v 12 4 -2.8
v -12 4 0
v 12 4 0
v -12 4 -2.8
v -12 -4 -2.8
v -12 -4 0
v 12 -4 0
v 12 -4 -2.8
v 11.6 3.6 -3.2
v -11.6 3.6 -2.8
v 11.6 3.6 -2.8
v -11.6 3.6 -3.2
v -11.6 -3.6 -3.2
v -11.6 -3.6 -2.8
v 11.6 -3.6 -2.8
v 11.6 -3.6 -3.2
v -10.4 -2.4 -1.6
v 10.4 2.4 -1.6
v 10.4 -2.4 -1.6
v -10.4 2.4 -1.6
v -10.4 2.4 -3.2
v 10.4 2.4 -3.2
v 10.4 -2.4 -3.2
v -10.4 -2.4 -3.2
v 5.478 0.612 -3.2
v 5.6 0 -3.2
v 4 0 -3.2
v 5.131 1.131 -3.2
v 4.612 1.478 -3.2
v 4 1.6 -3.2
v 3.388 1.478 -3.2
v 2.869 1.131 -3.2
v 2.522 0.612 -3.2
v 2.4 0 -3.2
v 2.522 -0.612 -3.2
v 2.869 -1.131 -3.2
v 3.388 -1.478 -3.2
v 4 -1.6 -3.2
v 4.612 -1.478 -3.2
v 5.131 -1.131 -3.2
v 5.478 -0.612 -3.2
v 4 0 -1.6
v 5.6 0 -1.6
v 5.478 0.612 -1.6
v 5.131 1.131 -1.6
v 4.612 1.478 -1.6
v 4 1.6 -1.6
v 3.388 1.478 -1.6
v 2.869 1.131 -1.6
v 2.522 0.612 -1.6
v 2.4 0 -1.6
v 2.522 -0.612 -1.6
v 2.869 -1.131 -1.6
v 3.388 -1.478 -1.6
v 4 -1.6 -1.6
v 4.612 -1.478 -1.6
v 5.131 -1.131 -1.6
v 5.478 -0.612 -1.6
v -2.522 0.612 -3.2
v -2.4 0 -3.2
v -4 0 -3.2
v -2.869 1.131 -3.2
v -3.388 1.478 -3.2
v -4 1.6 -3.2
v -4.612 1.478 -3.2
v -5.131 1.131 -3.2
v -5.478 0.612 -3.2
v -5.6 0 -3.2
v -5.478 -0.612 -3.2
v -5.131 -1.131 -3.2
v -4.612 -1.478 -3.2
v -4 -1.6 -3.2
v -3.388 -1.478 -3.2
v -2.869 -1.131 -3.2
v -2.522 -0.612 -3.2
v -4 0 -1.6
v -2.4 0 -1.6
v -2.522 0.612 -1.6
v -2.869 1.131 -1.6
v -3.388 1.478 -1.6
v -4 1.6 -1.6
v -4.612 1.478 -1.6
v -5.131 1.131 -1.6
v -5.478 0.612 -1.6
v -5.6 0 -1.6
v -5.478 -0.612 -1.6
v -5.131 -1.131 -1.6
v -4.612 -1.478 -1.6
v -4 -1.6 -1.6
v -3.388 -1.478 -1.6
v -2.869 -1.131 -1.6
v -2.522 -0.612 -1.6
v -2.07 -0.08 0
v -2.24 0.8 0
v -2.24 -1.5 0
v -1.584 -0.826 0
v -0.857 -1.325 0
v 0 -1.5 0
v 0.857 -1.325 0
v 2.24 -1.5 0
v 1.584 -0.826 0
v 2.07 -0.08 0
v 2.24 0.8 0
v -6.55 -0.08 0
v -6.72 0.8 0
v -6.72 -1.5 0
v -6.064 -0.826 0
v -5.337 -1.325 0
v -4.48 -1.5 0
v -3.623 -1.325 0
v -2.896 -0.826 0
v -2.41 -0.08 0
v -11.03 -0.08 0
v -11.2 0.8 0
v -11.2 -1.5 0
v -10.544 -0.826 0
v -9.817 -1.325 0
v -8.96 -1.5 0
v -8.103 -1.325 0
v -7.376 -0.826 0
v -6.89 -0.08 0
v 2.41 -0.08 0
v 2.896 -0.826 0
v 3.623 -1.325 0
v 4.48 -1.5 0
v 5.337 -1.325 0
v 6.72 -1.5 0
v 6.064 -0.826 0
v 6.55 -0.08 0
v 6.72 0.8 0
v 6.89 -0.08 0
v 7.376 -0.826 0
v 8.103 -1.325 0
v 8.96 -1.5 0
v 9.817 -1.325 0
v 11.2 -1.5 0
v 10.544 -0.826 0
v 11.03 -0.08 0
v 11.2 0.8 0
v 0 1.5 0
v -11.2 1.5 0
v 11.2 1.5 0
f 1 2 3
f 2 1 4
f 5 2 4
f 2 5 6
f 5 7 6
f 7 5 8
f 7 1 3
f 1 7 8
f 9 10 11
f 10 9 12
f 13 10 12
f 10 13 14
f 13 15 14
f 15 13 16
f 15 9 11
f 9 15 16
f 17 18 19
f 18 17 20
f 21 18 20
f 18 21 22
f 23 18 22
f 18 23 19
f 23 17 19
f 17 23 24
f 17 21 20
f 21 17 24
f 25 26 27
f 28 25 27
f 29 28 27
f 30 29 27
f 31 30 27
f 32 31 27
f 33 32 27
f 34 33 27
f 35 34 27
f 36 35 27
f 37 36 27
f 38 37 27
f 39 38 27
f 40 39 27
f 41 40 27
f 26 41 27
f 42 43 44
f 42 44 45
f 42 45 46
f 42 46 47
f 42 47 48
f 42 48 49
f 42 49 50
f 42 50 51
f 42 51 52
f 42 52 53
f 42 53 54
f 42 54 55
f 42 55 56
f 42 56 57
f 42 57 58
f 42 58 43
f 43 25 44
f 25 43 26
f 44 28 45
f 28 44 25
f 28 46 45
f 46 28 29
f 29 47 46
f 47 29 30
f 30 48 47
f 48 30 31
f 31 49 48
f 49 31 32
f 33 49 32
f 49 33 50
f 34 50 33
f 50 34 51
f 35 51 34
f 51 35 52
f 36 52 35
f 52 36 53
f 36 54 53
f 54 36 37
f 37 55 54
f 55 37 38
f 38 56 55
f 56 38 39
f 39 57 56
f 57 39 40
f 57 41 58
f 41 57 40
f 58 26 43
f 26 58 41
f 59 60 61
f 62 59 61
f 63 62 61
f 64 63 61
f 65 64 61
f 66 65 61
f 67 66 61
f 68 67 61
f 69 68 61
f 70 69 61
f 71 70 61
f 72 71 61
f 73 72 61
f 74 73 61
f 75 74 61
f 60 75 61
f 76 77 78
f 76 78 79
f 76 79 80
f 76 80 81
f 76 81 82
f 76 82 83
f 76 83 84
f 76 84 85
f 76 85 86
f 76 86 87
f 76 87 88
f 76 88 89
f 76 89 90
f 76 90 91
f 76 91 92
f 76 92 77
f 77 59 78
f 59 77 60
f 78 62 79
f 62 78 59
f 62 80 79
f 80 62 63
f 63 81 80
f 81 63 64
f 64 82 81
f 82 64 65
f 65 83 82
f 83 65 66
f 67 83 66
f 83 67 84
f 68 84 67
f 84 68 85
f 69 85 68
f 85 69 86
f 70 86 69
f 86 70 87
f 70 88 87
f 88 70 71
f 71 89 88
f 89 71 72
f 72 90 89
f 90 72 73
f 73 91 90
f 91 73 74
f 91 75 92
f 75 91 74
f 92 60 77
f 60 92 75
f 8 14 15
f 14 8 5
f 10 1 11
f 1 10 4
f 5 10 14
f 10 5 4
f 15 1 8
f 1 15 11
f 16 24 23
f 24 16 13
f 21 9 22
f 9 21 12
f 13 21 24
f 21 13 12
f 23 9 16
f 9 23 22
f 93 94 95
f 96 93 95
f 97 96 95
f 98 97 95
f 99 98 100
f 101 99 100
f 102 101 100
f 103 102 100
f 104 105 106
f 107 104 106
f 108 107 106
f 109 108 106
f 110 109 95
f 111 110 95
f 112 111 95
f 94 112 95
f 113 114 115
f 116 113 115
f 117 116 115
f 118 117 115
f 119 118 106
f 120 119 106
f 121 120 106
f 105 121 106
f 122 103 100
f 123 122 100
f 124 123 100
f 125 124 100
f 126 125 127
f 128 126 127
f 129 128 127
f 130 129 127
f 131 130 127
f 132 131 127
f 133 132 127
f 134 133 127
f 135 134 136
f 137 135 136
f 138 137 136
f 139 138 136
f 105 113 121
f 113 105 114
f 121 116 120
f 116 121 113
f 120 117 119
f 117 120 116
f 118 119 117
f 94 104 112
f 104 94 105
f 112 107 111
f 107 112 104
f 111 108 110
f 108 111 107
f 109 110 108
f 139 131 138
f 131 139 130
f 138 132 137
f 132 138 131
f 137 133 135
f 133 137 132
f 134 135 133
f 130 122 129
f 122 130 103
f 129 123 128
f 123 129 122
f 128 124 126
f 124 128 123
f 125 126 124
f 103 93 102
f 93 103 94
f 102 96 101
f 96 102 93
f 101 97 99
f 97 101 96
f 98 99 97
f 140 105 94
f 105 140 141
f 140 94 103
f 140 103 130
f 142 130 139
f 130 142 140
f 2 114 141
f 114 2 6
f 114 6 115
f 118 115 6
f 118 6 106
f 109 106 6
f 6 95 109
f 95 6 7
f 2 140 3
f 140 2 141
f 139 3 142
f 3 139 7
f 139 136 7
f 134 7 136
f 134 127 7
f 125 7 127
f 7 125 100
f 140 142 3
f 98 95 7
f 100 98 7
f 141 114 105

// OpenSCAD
// file: ../p/4-4edge.scad
use <../lib.scad>
function ldraw_lib__4_4edge() = [
// 0 Circle 1.0
// 0 Name: 4-4edge.dat
// 0 Author: James Jessiman
// 0 !LDRAW_ORG Primitive UPDATE 2017-01
// 0 !LICENSE Licensed under CC BY 2.0 and CC BY 4.0 : see CAreadme.txt
// 
// 0 BFC CERTIFY CCW
  [0,"BFC","CERTIFY"],
  [0,"BFC","CCW"],
// 
// 0 !HISTORY 1998-12-15 [PTadmin] Official Update 1998-10
// 0 !HISTORY 2005-12-28 [PTadmin] Official Update 2005-01
// 0 !HISTORY 2007-06-24 [PTadmin] Header formatted for Contributor Agreement
// 0 !HISTORY 2008-07-01 [PTadmin] Official Update 2008-01
// 0 !HISTORY 2017-01-15 [Steffen] BFCed
// 0 !HISTORY 2017-12-30 [PTadmin] Official Update 2017-01
// 
// 
// 2 24 1 0 0 0.9239 0 0.3827
  [2,24,1,0,0,0.9239,0,0.3827],
// 2 24 0.9239 0 0.3827 0.7071 0 0.7071
  [2,24,0.9239,0,0.3827,0.7071,0,0.7071],
// 2 24 0.7071 0 0.7071 0.3827 0 0.9239
  [2,24,0.7071,0,0.7071,0.3827,0,0.9239],
// 2 24 0.3827 0 0.9239 0 0 1
  [2,24,0.3827,0,0.9239,0,0,1],
// 2 24 0 0 1 -0.3827 0 0.9239
  [2,24,0,0,1,-0.3827,0,0.9239],
// 2 24 -0.3827 0 0.9239 -0.7071 0 0.7071
  [2,24,-0.3827,0,0.9239,-0.7071,0,0.7071],
// 2 24 -0.7071 0 0.7071 -0.9239 0 0.3827
  [2,24,-0.7071,0,0.7071,-0.9239,0,0.3827],
// 2 24 -0.9239 0 0.3827 -1 0 -0
  [2,24,-0.9239,0,0.3827,-1,0,-0],
// 2 24 -1 0 -0 -0.9239 0 -0.3827
  [2,24,-1,0,-0,-0.9239,0,-0.3827],
// 2 24 -0.9239 0 -0.3827 -0.7071 0 -0.7071
  [2,24,-0.9239,0,-0.3827,-0.7071,0,-0.7071],
// 2 24 -0.7071 0 -0.7071 -0.3827 0 -0.9239
  [2,24,-0.7071,0,-0.7071,-0.3827,0,-0.9239],
// 2 24 -0.3827 0 -0.9239 0 0 -1
  [2,24,-0.3827,0,-0.9239,0,0,-1],
// 2 24 0 0 -1 0.3827 0 -0.9239
  [2,24,0,0,-1,0.3827,0,-0.9239],
// 2 24 0.3827 0 -0.9239 0.7071 0 -0.7071
  [2,24,0.3827,0,-0.9239,0.7071,0,-0.7071],
// 2 24 0.7071 0 -0.7071 0.9239 0 -0.3827
  [2,24,0.7071,0,-0.7071,0.9239,0,-0.3827],
// 2 24 0.9239 0 -0.3827 1 0 0
  [2,24,0.9239,0,-0.3827,1,0,0],
];
module ldraw_lib__4_4edge(step=0, col=false, unit=2/5, alt=false, line=0.2, solid=!$preview)
    makepoly(ldraw_lib__4_4edge(), step=step, col=col, unit=unit, alt=alt, line=line, solid=solid);
ldraw_lib__4_4edge(line=0.2);
// file: ../p/4-4disc.scad
use <../lib.scad>
function ldraw_lib__4_4disc() = [
// 0 Disc 1.0
// 0 Name: 4-4disc.dat
// 0 Author: James Jessiman
// 0 !LDRAW_ORG Primitive UPDATE 2002-02
// 0 !LICENSE Licensed under CC BY 2.0 and CC BY 4.0 : see CAreadme.txt
// 
// 0 BFC CERTIFY CCW
  [0,"BFC","CERTIFY"],
  [0,"BFC","CCW"],
// 
// 0 !HISTORY 1998-12-15 [PTadmin] Official Update 1998-10
// 0 !HISTORY 2002-03-23 [sbliss] Added BFC statement
// 0 !HISTORY 2002-04-25 [PTadmin] Official Update 2002-02
// 0 !HISTORY 2007-06-24 [PTadmin] Header formatted for Contributor Agreement
// 0 !HISTORY 2008-07-01 [PTadmin] Official Update 2008-01
// 
// 
// 3 16 0 0 0 1 0 0 0.9239 0 0.3827
  [3,16,0,0,0,1,0,0,0.9239,0,0.3827],
// 3 16 0 0 0 0.9239 0 0.3827 0.7071 0 0.7071
  [3,16,0,0,0,0.9239,0,0.3827,0.7071,0,0.7071],
// 3 16 0 0 0 0.7071 0 0.7071 0.3827 0 0.9239
  [3,16,0,0,0,0.7071,0,0.7071,0.3827,0,0.9239],
// 3 16 0 0 0 0.3827 0 0.9239 0 0 1
  [3,16,0,0,0,0.3827,0,0.9239,0,0,1],
// 3 16 0 0 0 0 0 1 -0.3827 0 0.9239
  [3,16,0,0,0,0,0,1,-0.3827,0,0.9239],
// 3 16 0 0 0 -0.3827 0 0.9239 -0.7071 0 0.7071
  [3,16,0,0,0,-0.3827,0,0.9239,-0.7071,0,0.7071],
// 3 16 0 0 0 -0.7071 0 0.7071 -0.9239 0 0.3827
  [3,16,0,0,0,-0.7071,0,0.7071,-0.9239,0,0.3827],
// 3 16 0 0 0 -0.9239 0 0.3827 -1 0 -0
  [3,16,0,0,0,-0.9239,0,0.3827,-1,0,-0],
// 3 16 0 0 0 -1 0 -0 -0.9239 0 -0.3827
  [3,16,0,0,0,-1,0,-0,-0.9239,0,-0.3827],
// 3 16 0 0 0 -0.9239 0 -0.3827 -0.7071 0 -0.7071
  [3,16,0,0,0,-0.9239,0,-0.3827,-0.7071,0,-0.7071],
// 3 16 0 0 0 -0.7071 0 -0.7071 -0.3827 0 -0.9239
  [3,16,0,0,0,-0.7071,0,-0.7071,-0.3827,0,-0.9239],
// 3 16 0 0 0 -0.3827 0 -0.9239 0 0 -1
  [3,16,0,0,0,-0.3827,0,-0.9239,0,0,-1],
// 3 16 0 0 0 0 0 -1 0.3827 0 -0.9239
  [3,16,0,0,0,0,0,-1,0.3827,0,-0.9239],
// 3 16 0 0 0 0.3827 0 -0.9239 0.7071 0 -0.7071
  [3,16,0,0,0,0.3827,0,-0.9239,0.7071,0,-0.7071],
// 3 16 0 0 0 0.7071 0 -0.7071 0.9239 0 -0.3827
  [3,16,0,0,0,0.7071,0,-0.7071,0.9239,0,-0.3827],
// 3 16 0 0 0 0.9239 0 -0.3827 1 0 0
  [3,16,0,0,0,0.9239,0,-0.3827,1,0,0],
// 0
];
module ldraw_lib__4_4disc(step=0, col=false, unit=2/5, alt=false, line=0.2, solid=!$preview)
    makepoly(ldraw_lib__4_4disc(), step=step, col=col, unit=unit, alt=alt, line=line, solid=solid);
ldraw_lib__4_4disc(line=0.2);
// file: ../p/4-4cyli.scad
use <../lib.scad>
$fa=1; $fs=0.2;
function ldraw_lib__4_4cyli(realsolid=false) = [
// 0 Cylinder 1.0
// 0 Name: 4-4cyli.dat
// 0 Author: James Jessiman
// 0 !LDRAW_ORG Primitive UPDATE 2005-01
// 0 !LICENSE Licensed under CC BY 2.0 and CC BY 4.0 : see CAreadme.txt
// 
// 0 BFC CERTIFY CCW
  [0,"BFC","CERTIFY"],
  [0,"BFC","CCW"],
// 
// 0 !HISTORY 1998-12-15 [PTadmin] Official Update 1998-10
// 0 !HISTORY 2002-03-23 [sbliss] Added BFC statement; merged headers from files in distributions LDraw 0.27 and Complete.
// 0 !HISTORY 2002-04-25 [PTadmin] Official Update 2002-02
// 0 !HISTORY 2004-12-14 [guyvivan] BFC CCW
// 0 !HISTORY 2005-12-28 [PTadmin] Official Update 2005-01
// 0 !HISTORY 2007-06-24 [PTadmin] Header formatted for Contributor Agreement
// 0 !HISTORY 2008-07-01 [PTadmin] Official Update 2008-01
// 
// 
// 4 16 1 1 0 0.9239 1 0.3827 0.9239 0 0.3827 1 0 0
  [4,16,1,1,0,0.9239,1,0.3827,0.9239,0,0.3827,1,0,0],
// 5 24 1 0 0 1 1 0 0.9239 0 0.3827 0.9239 0 -0.3827
  [5,24,1,0,0,1,1,0,0.9239,0,0.3827,0.9239,0,-0.3827],
// 4 16 0.9239 1 0.3827 0.7071 1 0.7071 0.7071 0 0.7071 0.9239 0 0.3827
  [4,16,0.9239,1,0.3827,0.7071,1,0.7071,0.7071,0,0.7071,0.9239,0,0.3827],
// 5 24 0.9239 0 0.3827 0.9239 1 0.3827 0.7071 0 0.7071 1 0 0
  [5,24,0.9239,0,0.3827,0.9239,1,0.3827,0.7071,0,0.7071,1,0,0],
// 4 16 0.7071 1 0.7071 0.3827 1 0.9239 0.3827 0 0.9239 0.7071 0 0.7071
  [4,16,0.7071,1,0.7071,0.3827,1,0.9239,0.3827,0,0.9239,0.7071,0,0.7071],
// 5 24 0.7071 0 0.7071 0.7071 1 0.7071 0.3827 0 0.9239 0.9239 0 0.3827
  [5,24,0.7071,0,0.7071,0.7071,1,0.7071,0.3827,0,0.9239,0.9239,0,0.3827],
// 4 16 0.3827 1 0.9239 0 1 1 0 0 1 0.3827 0 0.9239
  [4,16,0.3827,1,0.9239,0,1,1,0,0,1,0.3827,0,0.9239],
// 5 24 0.3827 0 0.9239 0.3827 1 0.9239 0 0 1 0.7071 0 0.7071
  [5,24,0.3827,0,0.9239,0.3827,1,0.9239,0,0,1,0.7071,0,0.7071],
// 4 16 0 1 1 -0.3827 1 0.9239 -0.3827 0 0.9239 0 0 1
  [4,16,0,1,1,-0.3827,1,0.9239,-0.3827,0,0.9239,0,0,1],
// 5 24 0 0 1 0 1 1 -0.3827 0 0.9239 0.3827 0 0.9239
  [5,24,0,0,1,0,1,1,-0.3827,0,0.9239,0.3827,0,0.9239],
// 4 16 -0.3827 1 0.9239 -0.7071 1 0.7071 -0.7071 0 0.7071 -0.3827 0 0.9239
  [4,16,-0.3827,1,0.9239,-0.7071,1,0.7071,-0.7071,0,0.7071,-0.3827,0,0.9239],
// 5 24 -0.3827 0 0.9239 -0.3827 1 0.9239 -0.7071 0 0.7071 0 0 1
  [5,24,-0.3827,0,0.9239,-0.3827,1,0.9239,-0.7071,0,0.7071,0,0,1],
// 4 16 -0.7071 1 0.7071 -0.9239 1 0.3827 -0.9239 0 0.3827 -0.7071 0 0.7071
  [4,16,-0.7071,1,0.7071,-0.9239,1,0.3827,-0.9239,0,0.3827,-0.7071,0,0.7071],
// 5 24 -0.7071 0 0.7071 -0.7071 1 0.7071 -0.9239 0 0.3827 -0.3827 0 0.9239
  [5,24,-0.7071,0,0.7071,-0.7071,1,0.7071,-0.9239,0,0.3827,-0.3827,0,0.9239],
// 4 16 -0.9239 1 0.3827 -1 1 0 -1 0 0 -0.9239 0 0.3827
  [4,16,-0.9239,1,0.3827,-1,1,0,-1,0,0,-0.9239,0,0.3827],
// 5 24 -0.9239 0 0.3827 -0.9239 1 0.3827 -1 0 0 -0.7071 0 0.7071
  [5,24,-0.9239,0,0.3827,-0.9239,1,0.3827,-1,0,0,-0.7071,0,0.7071],
// 4 16 -1 1 0 -0.9239 1 -0.3827 -0.9239 0 -0.3827 -1 0 0
  [4,16,-1,1,0,-0.9239,1,-0.3827,-0.9239,0,-0.3827,-1,0,0],
// 5 24 -1 0 0 -1 1 0 -0.9239 0 -0.3827 -0.9239 0 0.3827
  [5,24,-1,0,0,-1,1,0,-0.9239,0,-0.3827,-0.9239,0,0.3827],
// 4 16 -0.9239 1 -0.3827 -0.7071 1 -0.7071 -0.7071 0 -0.7071 -0.9239 0 -0.3827
  [4,16,-0.9239,1,-0.3827,-0.7071,1,-0.7071,-0.7071,0,-0.7071,-0.9239,0,-0.3827],
// 5 24 -0.9239 0 -0.3827 -0.9239 1 -0.3827 -0.7071 0 -0.7071 -1 0 0
  [5,24,-0.9239,0,-0.3827,-0.9239,1,-0.3827,-0.7071,0,-0.7071,-1,0,0],
// 4 16 -0.7071 1 -0.7071 -0.3827 1 -0.9239 -0.3827 0 -0.9239 -0.7071 0 -0.7071
  [4,16,-0.7071,1,-0.7071,-0.3827,1,-0.9239,-0.3827,0,-0.9239,-0.7071,0,-0.7071],
// 5 24 -0.7071 0 -0.7071 -0.7071 1 -0.7071 -0.3827 0 -0.9239 -0.9239 0 -0.3827
  [5,24,-0.7071,0,-0.7071,-0.7071,1,-0.7071,-0.3827,0,-0.9239,-0.9239,0,-0.3827],
// 4 16 -0.3827 1 -0.9239 0 1 -1 0 0 -1 -0.3827 0 -0.9239
  [4,16,-0.3827,1,-0.9239,0,1,-1,0,0,-1,-0.3827,0,-0.9239],
// 5 24 -0.3827 0 -0.9239 -0.3827 1 -0.9239 0 0 -1 -0.7071 0 -0.7071
  [5,24,-0.3827,0,-0.9239,-0.3827,1,-0.9239,0,0,-1,-0.7071,0,-0.7071],
// 4 16 0 1 -1 0.3827 1 -0.9239 0.3827 0 -0.9239 0 0 -1
  [4,16,0,1,-1,0.3827,1,-0.9239,0.3827,0,-0.9239,0,0,-1],
// 5 24 0 0 -1 0 1 -1 0.3827 0 -0.9239 -0.3827 0 -0.9239
  [5,24,0,0,-1,0,1,-1,0.3827,0,-0.9239,-0.3827,0,-0.9239],
// 4 16 0.3827 1 -0.9239 0.7071 1 -0.7071 0.7071 0 -0.7071 0.3827 0 -0.9239
  [4,16,0.3827,1,-0.9239,0.7071,1,-0.7071,0.7071,0,-0.7071,0.3827,0,-0.9239],
// 5 24 0.3827 0 -0.9239 0.3827 1 -0.9239 0.7071 0 -0.7071 0 0 -1
  [5,24,0.3827,0,-0.9239,0.3827,1,-0.9239,0.7071,0,-0.7071,0,0,-1],
// 4 16 0.7071 1 -0.7071 0.9239 1 -0.3827 0.9239 0 -0.3827 0.7071 0 -0.7071
  [4,16,0.7071,1,-0.7071,0.9239,1,-0.3827,0.9239,0,-0.3827,0.7071,0,-0.7071],
// 5 24 0.7071 0 -0.7071 0.7071 1 -0.7071 0.9239 0 -0.3827 0.3827 0 -0.9239
  [5,24,0.7071,0,-0.7071,0.7071,1,-0.7071,0.9239,0,-0.3827,0.3827,0,-0.9239],
// 4 16 0.9239 1 -0.3827 1 1 0 1 0 0 0.9239 0 -0.3827
  [4,16,0.9239,1,-0.3827,1,1,0,1,0,0,0.9239,0,-0.3827],
// 5 24 0.9239 0 -0.3827 0.9239 1 -0.3827 1 0 0 0.7071 0 -0.7071
  [5,24,0.9239,0,-0.3827,0.9239,1,-0.3827,1,0,0,0.7071,0,-0.7071],
// 0
];
module ldraw_lib__4_4cyli(step=0, col=false, unit=2/5, alt=false, line=0.2, solid=!$preview)
    makepoly(ldraw_lib__4_4cyli(solid), step=step, col=col, unit=unit, alt=alt, line=line, solid=solid);
ldraw_lib__4_4cyli(line=0.2);
// file: ../p/stud3.scad
use <../lib.scad>
use <4-4cyli.scad>
use <4-4disc.scad>
use <4-4edge.scad>
function ldraw_lib__stud3() = [
// 0 Stud Tube Solid
// 0 Name: stud3.dat
// 0 Author: James Jessiman
// 0 !LDRAW_ORG Primitive UPDATE 2012-01
// 0 !LICENSE Licensed under CC BY 4.0 : see CAreadme.txt
// 
// 0 BFC CERTIFY CCW
  [0,"BFC","CERTIFY"],
  [0,"BFC","CCW"],
// 
// 0 !HISTORY 2002-04-04 [sbliss] Modified for BFC compliance
// 0 !HISTORY 2002-04-25 [PTadmin] Official Update 2002-02
// 0 !HISTORY 2007-06-24 [PTadmin] Header formatted for Contributor Agreement
// 0 !HISTORY 2008-07-01 [PTadmin] Official Update 2008-01
// 0 !HISTORY 2012-02-16 [Philo] Changed to CCW
// 0 !HISTORY 2012-03-30 [PTadmin] Official Update 2012-01
// 
// 
// 1 16 0 -4 0 4 0 0 0 1 0 0 0 4 4-4edge.dat
  [1,16,0,-4,0,4,0,0,0,1,0,0,0,4, ldraw_lib__4_4edge()],
// 1 16 0 0 0 4 0 0 0 1 0 0 0 4 4-4edge.dat
  [1,16,0,0,0,4,0,0,0,1,0,0,0,4, ldraw_lib__4_4edge()],
// 1 16 0 -4 0 4 0 0 0 1 0 0 0 4 4-4disc.dat
  [1,16,0,-4,0,4,0,0,0,1,0,0,0,4, ldraw_lib__4_4disc()],
  [-1,16,0,0,0,4,0,0,0,-1,0,0,0,4, ldraw_lib__4_4disc()],
// 1 16 0 -4 0 4 0 0 0 4 0 0 0 4 4-4cyli.dat
  [1,16,0,-4,0,4,0,0,0,4,0,0,0,4, ldraw_lib__4_4cyli()],
];
module ldraw_lib__stud3(step=0, col=false, unit=2/5, alt=false, line=0.2, solid=!$preview)
    makepoly(ldraw_lib__stud3(), step=step, col=col, unit=unit, alt=alt, line=line, solid=solid);
ldraw_lib__stud3(line=0.2);
// file: ../p/box5.scad
use <../lib.scad>
function ldraw_lib__box5() = [
// 0 Box with 5 Faces and All Edges
// 0 Name: box5.dat
// 0 Author: James Jessiman
// 0 !LDRAW_ORG Primitive UPDATE 2012-01
// 0 !LICENSE Licensed under CC BY 2.0 and CC BY 4.0 : see CAreadme.txt
// 
// 0 BFC CERTIFY CCW
  [0,"BFC","CERTIFY"],
  [0,"BFC","CCW"],
// 
// 0 !HISTORY 2002-04-03 [sbliss] Modified for BFC compliance
// 0 !HISTORY 2002-04-25 [PTadmin] Official Update 2002-02
// 0 !HISTORY 2007-06-24 [PTadmin] Header formatted for Contributor Agreement
// 0 !HISTORY 2008-07-01 [PTadmin] Official Update 2008-01
// 0 !HISTORY 2012-02-16 [Philo] Changed to CCW
// 0 !HISTORY 2012-03-30 [PTadmin] Official Update 2012-01
// 
// 
// 2 24 1 1 1 -1 1 1
  [2,24,1,1,1,-1,1,1],
// 2 24 -1 1 1 -1 1 -1
  [2,24,-1,1,1,-1,1,-1],
// 2 24 -1 1 -1 1 1 -1
  [2,24,-1,1,-1,1,1,-1],
// 2 24 1 1 -1 1 1 1
  [2,24,1,1,-1,1,1,1],
// 2 24 1 0 1 -1 0 1
  [2,24,1,0,1,-1,0,1],
// 2 24 -1 0 1 -1 0 -1
  [2,24,-1,0,1,-1,0,-1],
// 2 24 -1 0 -1 1 0 -1
  [2,24,-1,0,-1,1,0,-1],
// 2 24 1 0 -1 1 0 1
  [2,24,1,0,-1,1,0,1],
// 2 24 1 0 1 1 1 1
  [2,24,1,0,1,1,1,1],
// 2 24 -1 0 1 -1 1 1
  [2,24,-1,0,1,-1,1,1],
// 2 24 1 0 -1 1 1 -1
  [2,24,1,0,-1,1,1,-1],
// 2 24 -1 0 -1 -1 1 -1
  [2,24,-1,0,-1,-1,1,-1],
// 4 16 -1 1 1 1 1 1 1 1 -1 -1 1 -1
  [4,16,-1,1,1,1,1,1,1,1,-1,-1,1,-1],
// 4 16 -1 1 1 -1 0 1 1 0 1 1 1 1
  [4,16,-1,1,1,-1,0,1,1,0,1,1,1,1],
// 4 16 -1 1 -1 -1 0 -1 -1 0 1 -1 1 1
  [4,16,-1,1,-1,-1,0,-1,-1,0,1,-1,1,1],
// 4 16 1 1 -1 1 0 -1 -1 0 -1 -1 1 -1
  [4,16,1,1,-1,1,0,-1,-1,0,-1,-1,1,-1],
// 4 16 1 1 1 1 0 1 1 0 -1 1 1 -1
  [4,16,1,1,1,1,0,1,1,0,-1,1,1,-1],
];
makepoly(ldraw_lib__box5(), line=0.2);
// file: ../p/box4.scad
use <../lib.scad>
function ldraw_lib__box4() = [
// 0 Box with 4 Faces (2 Parallel Pairs) and All Edges
// 0 Name: box4.dat
// 0 Author: James Jessiman
// 0 !LDRAW_ORG Primitive UPDATE 2012-01
// 0 !LICENSE Licensed under CC BY 4.0 : see CAreadme.txt
// 
// 0 BFC CERTIFY CCW
  [0,"BFC","CERTIFY"],
  [0,"BFC","CCW"],
// 
// 0 !HISTORY 2002-04-03 [sbliss] Modified for BFC compliance
// 0 !HISTORY 2002-04-25 [PTadmin] Official Update 2002-02
// 0 !HISTORY 2007-06-24 [PTadmin] Header formatted for Contributor Agreement
// 0 !HISTORY 2008-07-01 [PTadmin] Official Update 2008-01
// 0 !HISTORY 2012-02-16 [Philo] Changed to CCW
// 0 !HISTORY 2012-03-30 [PTadmin] Official Update 2012-01
// 
// 
// 2 24 1 1 1 -1 1 1
  [2,24,1,1,1,-1,1,1],
// 2 24 -1 1 1 -1 1 -1
  [2,24,-1,1,1,-1,1,-1],
// 2 24 -1 1 -1 1 1 -1
  [2,24,-1,1,-1,1,1,-1],
// 2 24 1 1 -1 1 1 1
  [2,24,1,1,-1,1,1,1],
// 2 24 1 0 1 -1 0 1
  [2,24,1,0,1,-1,0,1],
// 2 24 -1 0 1 -1 0 -1
  [2,24,-1,0,1,-1,0,-1],
// 2 24 -1 0 -1 1 0 -1
  [2,24,-1,0,-1,1,0,-1],
// 2 24 1 0 -1 1 0 1
  [2,24,1,0,-1,1,0,1],
// 2 24 1 0 1 1 1 1
  [2,24,1,0,1,1,1,1],
// 2 24 -1 0 1 -1 1 1
  [2,24,-1,0,1,-1,1,1],
// 2 24 1 0 -1 1 1 -1
  [2,24,1,0,-1,1,1,-1],
// 2 24 -1 0 -1 -1 1 -1
  [2,24,-1,0,-1,-1,1,-1],
// 4 16 -1 1 1 -1 0 1 1 0 1 1 1 1
  [4,16,-1,1,1,-1,0,1,1,0,1,1,1,1],
// 4 16 -1 1 -1 -1 0 -1 -1 0 1 -1 1 1
  [4,16,-1,1,-1,-1,0,-1,-1,0,1,-1,1,1],
// 4 16 1 1 -1 1 0 -1 -1 0 -1 -1 1 -1
  [4,16,1,1,-1,1,0,-1,-1,0,-1,-1,1,-1],
// 4 16 1 1 1 1 0 1 1 0 -1 1 1 -1
  [4,16,1,1,1,1,0,1,1,0,-1,1,1,-1],
];
module ldraw_lib__box4(step=0, col=false, unit=2/5, alt=false, line=0.2, solid=!$preview)
    makepoly(ldraw_lib__box4(), step=step, col=col, unit=unit, alt=alt, line=line, solid=solid);
ldraw_lib__box4(line=0.2);
// file: s/63864s01.scad
use <../../lib.scad>
use <../../p/box4.scad>
use <../../p/box5.scad>
use <../../p/stud3.scad>
function ldraw_lib__s__63864s01() = [
// 0 ~Tile  1 x  3 without Top Face
// 0 Name: s\63864s01.dat
// 0 Author: Ulrich Röder [UR]
// 0 !LDRAW_ORG Subpart UPDATE 2019-01
// 0 !LICENSE Licensed under CC BY 4.0 : see CAreadme.txt
// 
// 0 BFC CERTIFY CCW
  [0,"BFC","CERTIFY"],
  [0,"BFC","CCW"],
// 
// 0 !HISTORY 2019-06-28 [PTadmin] Official Update 2019-01
// 
// 
// 1 16 0 0 0 30 0 0 0 7 0 0 0 10 box4.dat
  [1,16,0,0,0,30,0,0,0,7,0,0,0,10, ldraw_lib__box4()],
// 1 16 0 7 0 29 0 0 0 1 0 0 0 9 box4.dat
  [1,16,0,7,0,29,0,0,0,1,0,0,0,9, ldraw_lib__box4()],
// 0 BFC INVERTNEXT
  [0,"BFC","INVERTNEXT"],
// 1 16 0 8 0 -26 0 0 0 -4 0 0 0 6 box5.dat
  [1,16,0,8,0,-26,0,0,0,-4,0,0,0,6, ldraw_lib__box5()],
// 1 16 10 4 0 1 0 0 0 -1 0 0 0 1 stud3.dat
  [1,16,10,4,0,1,0,0,0,-1,0,0,0,1, ldraw_lib__stud3()],
// 1 16 -10 4 0 1 0 0 0 -1 0 0 0 1 stud3.dat
  [1,16,-10,4,0,1,0,0,0,-1,0,0,0,1, ldraw_lib__stud3()],
// 4 16 -30 7 -10 -29 7 -9 29 7 -9 30 7 -10
  [4,16,-30,7,-10,-29,7,-9,29,7,-9,30,7,-10],
// 4 16 30 7 10 29 7 9 -29 7 9 -30 7 10
  [4,16,30,7,10,29,7,9,-29,7,9,-30,7,10],
// 4 16 -30 7 -10 -30 7 10 -29 7 9 -29 7 -9
  [4,16,-30,7,-10,-30,7,10,-29,7,9,-29,7,-9],
// 4 16 30 7 10 30 7 -10 29 7 -9 29 7 9
  [4,16,30,7,10,30,7,-10,29,7,-9,29,7,9],
// 4 16 -29 8 -9 -26 8 -6 26 8 -6 29 8 -9
  [4,16,-29,8,-9,-26,8,-6,26,8,-6,29,8,-9],
// 4 16 29 8 9 26 8 6 -26 8 6 -29 8 9
  [4,16,29,8,9,26,8,6,-26,8,6,-29,8,9],
// 4 16 -29 8 -9 -29 8 9 -26 8 6 -26 8 -6
  [4,16,-29,8,-9,-29,8,9,-26,8,6,-26,8,-6],
// 4 16 29 8 9 29 8 -9 26 8 -6 26 8 6
  [4,16,29,8,9,29,8,-9,26,8,-6,26,8,6],
];
module ldraw_lib__s__63864s01(step=0, col=false, unit=2/5, alt=false, line=0.2, solid=!$preview)
    makepoly(ldraw_lib__s__63864s01(), step=step, col=col, unit=unit, alt=alt, line=line, solid=solid);
ldraw_lib__s__63864s01(line=0.2);
// file: ../p/2-4ndis.scad
use <../lib.scad>
function ldraw_lib__2_4ndis() = [
// 0 Disc Negative 0.5
// 0 Name: 2-4ndis.dat
// 0 Author: James Jessiman
// 0 !LDRAW_ORG Primitive UPDATE 2012-01
// 0 !LICENSE Licensed under CC BY 4.0 : see CAreadme.txt
// 
// 0 BFC CERTIFY CCW
  [0,"BFC","CERTIFY"],
  [0,"BFC","CCW"],
// 
// 0 !HISTORY 2002-03-23 [sbliss] Added BFC statement; compacted code
// 0 !HISTORY 2002-04-25 [PTadmin] Official Update 2002-02
// 0 !HISTORY 2007-06-24 [PTadmin] Header formatted for Contributor Agreement
// 0 !HISTORY 2008-07-01 [PTadmin] Official Update 2008-01
// 0 !HISTORY 2012-02-16 [Philo] Changed to CCW
// 0 !HISTORY 2012-03-30 [PTadmin] Official Update 2012-01
// 
// 
// 3 16 0.9239 0 0.3827 1 0 0 1 0 1
  [3,16,0.9239,0,0.3827,1,0,0,1,0,1],
// 3 16 0.7071 0 0.7071 0.9239 0 0.3827 1 0 1
  [3,16,0.7071,0,0.7071,0.9239,0,0.3827,1,0,1],
// 3 16 0.3827 0 0.9239 0.7071 0 0.7071 1 0 1
  [3,16,0.3827,0,0.9239,0.7071,0,0.7071,1,0,1],
// 3 16 0 0 1 0.3827 0 0.9239 1 0 1
  [3,16,0,0,1,0.3827,0,0.9239,1,0,1],
// 3 16 -0.3827 0 0.9239 0 0 1 -1 0 1
  [3,16,-0.3827,0,0.9239,0,0,1,-1,0,1],
// 3 16 -0.7071 0 0.7071 -0.3827 0 0.9239 -1 0 1
  [3,16,-0.7071,0,0.7071,-0.3827,0,0.9239,-1,0,1],
// 3 16 -0.9239 0 0.3827 -0.7071 0 0.7071 -1 0 1
  [3,16,-0.9239,0,0.3827,-0.7071,0,0.7071,-1,0,1],
// 3 16 -1 0 0 -0.9239 0 0.3827 -1 0 1
  [3,16,-1,0,0,-0.9239,0,0.3827,-1,0,1],
];
module ldraw_lib__2_4ndis(step=0, col=false, unit=2/5, alt=false, line=0.2, solid=!$preview)
    makepoly(ldraw_lib__2_4ndis(), step=step, col=col, unit=unit, alt=alt, line=line, solid=solid);
ldraw_lib__2_4ndis(line=0.2);
// file: ../p/2-4chrd.scad
use <../lib.scad>
$fa=1; $fs=0.2;
function ldraw_lib__2_4chrd(realsolid=false) = [
// 0 Chord 0.5
// 0 Name: 2-4chrd.dat
// 0 Author: Philippe Hurbain [Philo]
// 0 !LDRAW_ORG Primitive UPDATE 2014-01
// 0 !LICENSE Licensed under CC BY 2.0 and CC BY 4.0 : see CAreadme.txt
// 
// 0 BFC CERTIFY CCW
  [0,"BFC","CERTIFY"],
  [0,"BFC","CCW"],
// 
// 0 !HISTORY 2014-06-21 [PTadmin] Official Update 2014-01
// 
// 
// 4 16 0.9239 0 0.3827 -0.9239 0 0.3827 -1 0 0 1 0 0
  [4,16,0.9239,0,0.3827,-0.9239,0,0.3827,-1,0,0,1,0,0],
// 4 16 0.7071 0 0.7071 -0.7071 0 0.7071 -0.9239 0 0.3827 0.9239 0 0.3827
  [4,16,0.7071,0,0.7071,-0.7071,0,0.7071,-0.9239,0,0.3827,0.9239,0,0.3827],
// 4 16 0.3827 0 0.9239 -0.3827 0 0.9239 -0.7071 0 0.7071 0.7071 0 0.7071
  [4,16,0.3827,0,0.9239,-0.3827,0,0.9239,-0.7071,0,0.7071,0.7071,0,0.7071],
// 3 16 0 0 1 -0.3827 0 0.9239 0.3827 0 0.9239
  [3,16,0,0,1,-0.3827,0,0.9239,0.3827,0,0.9239],
];
module ldraw_lib__2_4chrd(step=0, col=false, unit=2/5, alt=false, line=0.2, solid=!$preview)
    makepoly(ldraw_lib__2_4chrd(solid), step=step, col=col, unit=unit, alt=alt, line=line, solid=solid);
ldraw_lib__2_4chrd(line=0.2);
// main file
use <../lib.scad>
use <../p/2-4chrd.scad>
use <../p/2-4ndis.scad>
use <s/63864s01.scad>
function ldraw_lib__63864pz4() = [
// 0 Tile  1 x  3 with  5 White Half Circles Pattern
// 0 Name: 63864pz4.dat
// 0 Author: Evert-Jan Boer [ejboer]
// 0 !LDRAW_ORG Part UPDATE 2025-06
// 0 !LICENSE Licensed under CC BY 4.0 : see CAreadme.txt
// 
// 0 BFC CERTIFY CCW
  [0,"BFC","CERTIFY"],
  [0,"BFC","CCW"],
// 
// 0 !KEYWORDS Anxiety, Brickheadz, Bricklink 63864pb258, Disney, Inside Out
// 0 !KEYWORDS Rebrickable 63864pr9999, Set 40749, Teeth
// 
// 0 !HISTORY 2025-06-26 [OrionP] Official Update 2025-06
// 
// 1 16 0 0 0 1 0 0 0 1 0 0 0 1 s\63864s01.dat
  [1,16,0,0,0,1,0,0,0,1,0,0,0,1, ldraw_lib__s__63864s01()],
// 1 16 0 0 2 -5.6 0 0 0 1 0 0 0 -5.75 2-4ndis.dat
  [1,16,0,0,2,-5.6,0,0,0,1,0,0,0,-5.75, ldraw_lib__2_4ndis()],
// 1 16 -11.2 0 2 -5.6 0 0 0 1 0 0 0 -5.75 2-4ndis.dat
  [1,16,-11.2,0,2,-5.6,0,0,0,1,0,0,0,-5.75, ldraw_lib__2_4ndis()],
// 1 16 -22.4 0 2 -5.6 0 0 0 1 0 0 0 -5.75 2-4ndis.dat
  [1,16,-22.4,0,2,-5.6,0,0,0,1,0,0,0,-5.75, ldraw_lib__2_4ndis()],
// 1 16 11.2 0 2 -5.6 0 0 0 1 0 0 0 -5.75 2-4ndis.dat
  [1,16,11.2,0,2,-5.6,0,0,0,1,0,0,0,-5.75, ldraw_lib__2_4ndis()],
// 1 16 22.4 0 2 -5.6 0 0 0 1 0 0 0 -5.75 2-4ndis.dat
  [1,16,22.4,0,2,-5.6,0,0,0,1,0,0,0,-5.75, ldraw_lib__2_4ndis()],
// 1 15 -22.4 0 2 -5.6 0 0 0 1 0 0 0 -5.75 2-4chrd.dat
  [1,15,-22.4,0,2,-5.6,0,0,0,1,0,0,0,-5.75, ldraw_lib__2_4chrd()],
// 1 15 -11.2 0 2 -5.6 0 0 0 1 0 0 0 -5.75 2-4chrd.dat
  [1,15,-11.2,0,2,-5.6,0,0,0,1,0,0,0,-5.75, ldraw_lib__2_4chrd()],
// 1 15 22.4 0 2 -5.6 0 0 0 1 0 0 0 -5.75 2-4chrd.dat
  [1,15,22.4,0,2,-5.6,0,0,0,1,0,0,0,-5.75, ldraw_lib__2_4chrd()],
// 1 15 11.2 0 2 -5.6 0 0 0 1 0 0 0 -5.75 2-4chrd.dat
  [1,15,11.2,0,2,-5.6,0,0,0,1,0,0,0,-5.75, ldraw_lib__2_4chrd()],
// 1 15 0 0 2 -5.6 0 0 0 1 0 0 0 -5.75 2-4chrd.dat
  [1,15,0,0,2,-5.6,0,0,0,1,0,0,0,-5.75, ldraw_lib__2_4chrd()],
// 4 15 0 0 3.75 -28 0 3.75 -16.8 0 2 -5.6 0 2
  [4,15,0,0,3.75,-28,0,3.75,-16.8,0,2,-5.6,0,2],
// 3 15 0 0 3.75 -5.6 0 2 5.6 0 2
  [3,15,0,0,3.75,-5.6,0,2,5.6,0,2],
// 3 15 0 0 3.75 5.6 0 2 16.8 0 2
  [3,15,0,0,3.75,5.6,0,2,16.8,0,2],
// 4 15 28 0 3.75 0 0 3.75 16.8 0 2 28 0 2
  [4,15,28,0,3.75,0,0,3.75,16.8,0,2,28,0,2],
// 4 16 -28 0 2 -28 0 3.75 -30 0 10 -30 0 -10
  [4,16,-28,0,2,-28,0,3.75,-30,0,10,-30,0,-10],
// 3 16 -28 0 2 -30 0 -10 -28 0 -3.75
  [3,16,-28,0,2,-30,0,-10,-28,0,-3.75],
// 3 16 -22.4 0 -3.75 -28 0 -3.75 -30 0 -10
  [3,16,-22.4,0,-3.75,-28,0,-3.75,-30,0,-10],
// 3 16 -22.4 0 -3.75 -30 0 -10 -16.8 0 -3.75
  [3,16,-22.4,0,-3.75,-30,0,-10,-16.8,0,-3.75],
// 3 16 -11.2 0 -3.75 -16.8 0 -3.75 -30 0 -10
  [3,16,-11.2,0,-3.75,-16.8,0,-3.75,-30,0,-10],
// 4 16 -5.6 0 -3.75 -11.2 0 -3.75 -30 0 -10 30 0 -10
  [4,16,-5.6,0,-3.75,-11.2,0,-3.75,-30,0,-10,30,0,-10],
// 4 16 -30 0 10 -28 0 3.75 0 0 3.75 30 0 10
  [4,16,-30,0,10,-28,0,3.75,0,0,3.75,30,0,10],
// 4 16 30 0 10 28 0 3.75 28 0 2 30 0 -10
  [4,16,30,0,10,28,0,3.75,28,0,2,30,0,-10],
// 3 16 28 0 2 28 0 -3.75 30 0 -10
  [3,16,28,0,2,28,0,-3.75,30,0,-10],
// 3 16 22.4 0 -3.75 30 0 -10 28 0 -3.75
  [3,16,22.4,0,-3.75,30,0,-10,28,0,-3.75],
// 3 16 22.4 0 -3.75 16.8 0 -3.75 30 0 -10
  [3,16,22.4,0,-3.75,16.8,0,-3.75,30,0,-10],
// 3 16 11.2 0 -3.75 30 0 -10 16.8 0 -3.75
  [3,16,11.2,0,-3.75,30,0,-10,16.8,0,-3.75],
// 3 16 30 0 -10 11.2 0 -3.75 5.6 0 -3.75
  [3,16,30,0,-10,11.2,0,-3.75,5.6,0,-3.75],
// 3 16 0 0 3.75 28 0 3.75 30 0 10
  [3,16,0,0,3.75,28,0,3.75,30,0,10],
// 3 16 0 0 -3.75 -5.6 0 -3.75 30 0 -10
  [3,16,0,0,-3.75,-5.6,0,-3.75,30,0,-10],
// 3 16 5.6 0 -3.75 0 0 -3.75 30 0 -10
  [3,16,5.6,0,-3.75,0,0,-3.75,30,0,-10],
// 3 15 -28 0 3.75 -28 0 2 -16.8 0 2
  [3,15,-28,0,3.75,-28,0,2,-16.8,0,2],
];
module ldraw_lib__63864pz4(step=0, col=false, unit=2/5, alt=false, line=0.2, solid=!$preview)
    makepoly(ldraw_lib__63864pz4(), step=step, col=col, unit=unit, alt=alt, line=line, solid=solid);
ldraw_lib__63864pz4(line=0.2);
